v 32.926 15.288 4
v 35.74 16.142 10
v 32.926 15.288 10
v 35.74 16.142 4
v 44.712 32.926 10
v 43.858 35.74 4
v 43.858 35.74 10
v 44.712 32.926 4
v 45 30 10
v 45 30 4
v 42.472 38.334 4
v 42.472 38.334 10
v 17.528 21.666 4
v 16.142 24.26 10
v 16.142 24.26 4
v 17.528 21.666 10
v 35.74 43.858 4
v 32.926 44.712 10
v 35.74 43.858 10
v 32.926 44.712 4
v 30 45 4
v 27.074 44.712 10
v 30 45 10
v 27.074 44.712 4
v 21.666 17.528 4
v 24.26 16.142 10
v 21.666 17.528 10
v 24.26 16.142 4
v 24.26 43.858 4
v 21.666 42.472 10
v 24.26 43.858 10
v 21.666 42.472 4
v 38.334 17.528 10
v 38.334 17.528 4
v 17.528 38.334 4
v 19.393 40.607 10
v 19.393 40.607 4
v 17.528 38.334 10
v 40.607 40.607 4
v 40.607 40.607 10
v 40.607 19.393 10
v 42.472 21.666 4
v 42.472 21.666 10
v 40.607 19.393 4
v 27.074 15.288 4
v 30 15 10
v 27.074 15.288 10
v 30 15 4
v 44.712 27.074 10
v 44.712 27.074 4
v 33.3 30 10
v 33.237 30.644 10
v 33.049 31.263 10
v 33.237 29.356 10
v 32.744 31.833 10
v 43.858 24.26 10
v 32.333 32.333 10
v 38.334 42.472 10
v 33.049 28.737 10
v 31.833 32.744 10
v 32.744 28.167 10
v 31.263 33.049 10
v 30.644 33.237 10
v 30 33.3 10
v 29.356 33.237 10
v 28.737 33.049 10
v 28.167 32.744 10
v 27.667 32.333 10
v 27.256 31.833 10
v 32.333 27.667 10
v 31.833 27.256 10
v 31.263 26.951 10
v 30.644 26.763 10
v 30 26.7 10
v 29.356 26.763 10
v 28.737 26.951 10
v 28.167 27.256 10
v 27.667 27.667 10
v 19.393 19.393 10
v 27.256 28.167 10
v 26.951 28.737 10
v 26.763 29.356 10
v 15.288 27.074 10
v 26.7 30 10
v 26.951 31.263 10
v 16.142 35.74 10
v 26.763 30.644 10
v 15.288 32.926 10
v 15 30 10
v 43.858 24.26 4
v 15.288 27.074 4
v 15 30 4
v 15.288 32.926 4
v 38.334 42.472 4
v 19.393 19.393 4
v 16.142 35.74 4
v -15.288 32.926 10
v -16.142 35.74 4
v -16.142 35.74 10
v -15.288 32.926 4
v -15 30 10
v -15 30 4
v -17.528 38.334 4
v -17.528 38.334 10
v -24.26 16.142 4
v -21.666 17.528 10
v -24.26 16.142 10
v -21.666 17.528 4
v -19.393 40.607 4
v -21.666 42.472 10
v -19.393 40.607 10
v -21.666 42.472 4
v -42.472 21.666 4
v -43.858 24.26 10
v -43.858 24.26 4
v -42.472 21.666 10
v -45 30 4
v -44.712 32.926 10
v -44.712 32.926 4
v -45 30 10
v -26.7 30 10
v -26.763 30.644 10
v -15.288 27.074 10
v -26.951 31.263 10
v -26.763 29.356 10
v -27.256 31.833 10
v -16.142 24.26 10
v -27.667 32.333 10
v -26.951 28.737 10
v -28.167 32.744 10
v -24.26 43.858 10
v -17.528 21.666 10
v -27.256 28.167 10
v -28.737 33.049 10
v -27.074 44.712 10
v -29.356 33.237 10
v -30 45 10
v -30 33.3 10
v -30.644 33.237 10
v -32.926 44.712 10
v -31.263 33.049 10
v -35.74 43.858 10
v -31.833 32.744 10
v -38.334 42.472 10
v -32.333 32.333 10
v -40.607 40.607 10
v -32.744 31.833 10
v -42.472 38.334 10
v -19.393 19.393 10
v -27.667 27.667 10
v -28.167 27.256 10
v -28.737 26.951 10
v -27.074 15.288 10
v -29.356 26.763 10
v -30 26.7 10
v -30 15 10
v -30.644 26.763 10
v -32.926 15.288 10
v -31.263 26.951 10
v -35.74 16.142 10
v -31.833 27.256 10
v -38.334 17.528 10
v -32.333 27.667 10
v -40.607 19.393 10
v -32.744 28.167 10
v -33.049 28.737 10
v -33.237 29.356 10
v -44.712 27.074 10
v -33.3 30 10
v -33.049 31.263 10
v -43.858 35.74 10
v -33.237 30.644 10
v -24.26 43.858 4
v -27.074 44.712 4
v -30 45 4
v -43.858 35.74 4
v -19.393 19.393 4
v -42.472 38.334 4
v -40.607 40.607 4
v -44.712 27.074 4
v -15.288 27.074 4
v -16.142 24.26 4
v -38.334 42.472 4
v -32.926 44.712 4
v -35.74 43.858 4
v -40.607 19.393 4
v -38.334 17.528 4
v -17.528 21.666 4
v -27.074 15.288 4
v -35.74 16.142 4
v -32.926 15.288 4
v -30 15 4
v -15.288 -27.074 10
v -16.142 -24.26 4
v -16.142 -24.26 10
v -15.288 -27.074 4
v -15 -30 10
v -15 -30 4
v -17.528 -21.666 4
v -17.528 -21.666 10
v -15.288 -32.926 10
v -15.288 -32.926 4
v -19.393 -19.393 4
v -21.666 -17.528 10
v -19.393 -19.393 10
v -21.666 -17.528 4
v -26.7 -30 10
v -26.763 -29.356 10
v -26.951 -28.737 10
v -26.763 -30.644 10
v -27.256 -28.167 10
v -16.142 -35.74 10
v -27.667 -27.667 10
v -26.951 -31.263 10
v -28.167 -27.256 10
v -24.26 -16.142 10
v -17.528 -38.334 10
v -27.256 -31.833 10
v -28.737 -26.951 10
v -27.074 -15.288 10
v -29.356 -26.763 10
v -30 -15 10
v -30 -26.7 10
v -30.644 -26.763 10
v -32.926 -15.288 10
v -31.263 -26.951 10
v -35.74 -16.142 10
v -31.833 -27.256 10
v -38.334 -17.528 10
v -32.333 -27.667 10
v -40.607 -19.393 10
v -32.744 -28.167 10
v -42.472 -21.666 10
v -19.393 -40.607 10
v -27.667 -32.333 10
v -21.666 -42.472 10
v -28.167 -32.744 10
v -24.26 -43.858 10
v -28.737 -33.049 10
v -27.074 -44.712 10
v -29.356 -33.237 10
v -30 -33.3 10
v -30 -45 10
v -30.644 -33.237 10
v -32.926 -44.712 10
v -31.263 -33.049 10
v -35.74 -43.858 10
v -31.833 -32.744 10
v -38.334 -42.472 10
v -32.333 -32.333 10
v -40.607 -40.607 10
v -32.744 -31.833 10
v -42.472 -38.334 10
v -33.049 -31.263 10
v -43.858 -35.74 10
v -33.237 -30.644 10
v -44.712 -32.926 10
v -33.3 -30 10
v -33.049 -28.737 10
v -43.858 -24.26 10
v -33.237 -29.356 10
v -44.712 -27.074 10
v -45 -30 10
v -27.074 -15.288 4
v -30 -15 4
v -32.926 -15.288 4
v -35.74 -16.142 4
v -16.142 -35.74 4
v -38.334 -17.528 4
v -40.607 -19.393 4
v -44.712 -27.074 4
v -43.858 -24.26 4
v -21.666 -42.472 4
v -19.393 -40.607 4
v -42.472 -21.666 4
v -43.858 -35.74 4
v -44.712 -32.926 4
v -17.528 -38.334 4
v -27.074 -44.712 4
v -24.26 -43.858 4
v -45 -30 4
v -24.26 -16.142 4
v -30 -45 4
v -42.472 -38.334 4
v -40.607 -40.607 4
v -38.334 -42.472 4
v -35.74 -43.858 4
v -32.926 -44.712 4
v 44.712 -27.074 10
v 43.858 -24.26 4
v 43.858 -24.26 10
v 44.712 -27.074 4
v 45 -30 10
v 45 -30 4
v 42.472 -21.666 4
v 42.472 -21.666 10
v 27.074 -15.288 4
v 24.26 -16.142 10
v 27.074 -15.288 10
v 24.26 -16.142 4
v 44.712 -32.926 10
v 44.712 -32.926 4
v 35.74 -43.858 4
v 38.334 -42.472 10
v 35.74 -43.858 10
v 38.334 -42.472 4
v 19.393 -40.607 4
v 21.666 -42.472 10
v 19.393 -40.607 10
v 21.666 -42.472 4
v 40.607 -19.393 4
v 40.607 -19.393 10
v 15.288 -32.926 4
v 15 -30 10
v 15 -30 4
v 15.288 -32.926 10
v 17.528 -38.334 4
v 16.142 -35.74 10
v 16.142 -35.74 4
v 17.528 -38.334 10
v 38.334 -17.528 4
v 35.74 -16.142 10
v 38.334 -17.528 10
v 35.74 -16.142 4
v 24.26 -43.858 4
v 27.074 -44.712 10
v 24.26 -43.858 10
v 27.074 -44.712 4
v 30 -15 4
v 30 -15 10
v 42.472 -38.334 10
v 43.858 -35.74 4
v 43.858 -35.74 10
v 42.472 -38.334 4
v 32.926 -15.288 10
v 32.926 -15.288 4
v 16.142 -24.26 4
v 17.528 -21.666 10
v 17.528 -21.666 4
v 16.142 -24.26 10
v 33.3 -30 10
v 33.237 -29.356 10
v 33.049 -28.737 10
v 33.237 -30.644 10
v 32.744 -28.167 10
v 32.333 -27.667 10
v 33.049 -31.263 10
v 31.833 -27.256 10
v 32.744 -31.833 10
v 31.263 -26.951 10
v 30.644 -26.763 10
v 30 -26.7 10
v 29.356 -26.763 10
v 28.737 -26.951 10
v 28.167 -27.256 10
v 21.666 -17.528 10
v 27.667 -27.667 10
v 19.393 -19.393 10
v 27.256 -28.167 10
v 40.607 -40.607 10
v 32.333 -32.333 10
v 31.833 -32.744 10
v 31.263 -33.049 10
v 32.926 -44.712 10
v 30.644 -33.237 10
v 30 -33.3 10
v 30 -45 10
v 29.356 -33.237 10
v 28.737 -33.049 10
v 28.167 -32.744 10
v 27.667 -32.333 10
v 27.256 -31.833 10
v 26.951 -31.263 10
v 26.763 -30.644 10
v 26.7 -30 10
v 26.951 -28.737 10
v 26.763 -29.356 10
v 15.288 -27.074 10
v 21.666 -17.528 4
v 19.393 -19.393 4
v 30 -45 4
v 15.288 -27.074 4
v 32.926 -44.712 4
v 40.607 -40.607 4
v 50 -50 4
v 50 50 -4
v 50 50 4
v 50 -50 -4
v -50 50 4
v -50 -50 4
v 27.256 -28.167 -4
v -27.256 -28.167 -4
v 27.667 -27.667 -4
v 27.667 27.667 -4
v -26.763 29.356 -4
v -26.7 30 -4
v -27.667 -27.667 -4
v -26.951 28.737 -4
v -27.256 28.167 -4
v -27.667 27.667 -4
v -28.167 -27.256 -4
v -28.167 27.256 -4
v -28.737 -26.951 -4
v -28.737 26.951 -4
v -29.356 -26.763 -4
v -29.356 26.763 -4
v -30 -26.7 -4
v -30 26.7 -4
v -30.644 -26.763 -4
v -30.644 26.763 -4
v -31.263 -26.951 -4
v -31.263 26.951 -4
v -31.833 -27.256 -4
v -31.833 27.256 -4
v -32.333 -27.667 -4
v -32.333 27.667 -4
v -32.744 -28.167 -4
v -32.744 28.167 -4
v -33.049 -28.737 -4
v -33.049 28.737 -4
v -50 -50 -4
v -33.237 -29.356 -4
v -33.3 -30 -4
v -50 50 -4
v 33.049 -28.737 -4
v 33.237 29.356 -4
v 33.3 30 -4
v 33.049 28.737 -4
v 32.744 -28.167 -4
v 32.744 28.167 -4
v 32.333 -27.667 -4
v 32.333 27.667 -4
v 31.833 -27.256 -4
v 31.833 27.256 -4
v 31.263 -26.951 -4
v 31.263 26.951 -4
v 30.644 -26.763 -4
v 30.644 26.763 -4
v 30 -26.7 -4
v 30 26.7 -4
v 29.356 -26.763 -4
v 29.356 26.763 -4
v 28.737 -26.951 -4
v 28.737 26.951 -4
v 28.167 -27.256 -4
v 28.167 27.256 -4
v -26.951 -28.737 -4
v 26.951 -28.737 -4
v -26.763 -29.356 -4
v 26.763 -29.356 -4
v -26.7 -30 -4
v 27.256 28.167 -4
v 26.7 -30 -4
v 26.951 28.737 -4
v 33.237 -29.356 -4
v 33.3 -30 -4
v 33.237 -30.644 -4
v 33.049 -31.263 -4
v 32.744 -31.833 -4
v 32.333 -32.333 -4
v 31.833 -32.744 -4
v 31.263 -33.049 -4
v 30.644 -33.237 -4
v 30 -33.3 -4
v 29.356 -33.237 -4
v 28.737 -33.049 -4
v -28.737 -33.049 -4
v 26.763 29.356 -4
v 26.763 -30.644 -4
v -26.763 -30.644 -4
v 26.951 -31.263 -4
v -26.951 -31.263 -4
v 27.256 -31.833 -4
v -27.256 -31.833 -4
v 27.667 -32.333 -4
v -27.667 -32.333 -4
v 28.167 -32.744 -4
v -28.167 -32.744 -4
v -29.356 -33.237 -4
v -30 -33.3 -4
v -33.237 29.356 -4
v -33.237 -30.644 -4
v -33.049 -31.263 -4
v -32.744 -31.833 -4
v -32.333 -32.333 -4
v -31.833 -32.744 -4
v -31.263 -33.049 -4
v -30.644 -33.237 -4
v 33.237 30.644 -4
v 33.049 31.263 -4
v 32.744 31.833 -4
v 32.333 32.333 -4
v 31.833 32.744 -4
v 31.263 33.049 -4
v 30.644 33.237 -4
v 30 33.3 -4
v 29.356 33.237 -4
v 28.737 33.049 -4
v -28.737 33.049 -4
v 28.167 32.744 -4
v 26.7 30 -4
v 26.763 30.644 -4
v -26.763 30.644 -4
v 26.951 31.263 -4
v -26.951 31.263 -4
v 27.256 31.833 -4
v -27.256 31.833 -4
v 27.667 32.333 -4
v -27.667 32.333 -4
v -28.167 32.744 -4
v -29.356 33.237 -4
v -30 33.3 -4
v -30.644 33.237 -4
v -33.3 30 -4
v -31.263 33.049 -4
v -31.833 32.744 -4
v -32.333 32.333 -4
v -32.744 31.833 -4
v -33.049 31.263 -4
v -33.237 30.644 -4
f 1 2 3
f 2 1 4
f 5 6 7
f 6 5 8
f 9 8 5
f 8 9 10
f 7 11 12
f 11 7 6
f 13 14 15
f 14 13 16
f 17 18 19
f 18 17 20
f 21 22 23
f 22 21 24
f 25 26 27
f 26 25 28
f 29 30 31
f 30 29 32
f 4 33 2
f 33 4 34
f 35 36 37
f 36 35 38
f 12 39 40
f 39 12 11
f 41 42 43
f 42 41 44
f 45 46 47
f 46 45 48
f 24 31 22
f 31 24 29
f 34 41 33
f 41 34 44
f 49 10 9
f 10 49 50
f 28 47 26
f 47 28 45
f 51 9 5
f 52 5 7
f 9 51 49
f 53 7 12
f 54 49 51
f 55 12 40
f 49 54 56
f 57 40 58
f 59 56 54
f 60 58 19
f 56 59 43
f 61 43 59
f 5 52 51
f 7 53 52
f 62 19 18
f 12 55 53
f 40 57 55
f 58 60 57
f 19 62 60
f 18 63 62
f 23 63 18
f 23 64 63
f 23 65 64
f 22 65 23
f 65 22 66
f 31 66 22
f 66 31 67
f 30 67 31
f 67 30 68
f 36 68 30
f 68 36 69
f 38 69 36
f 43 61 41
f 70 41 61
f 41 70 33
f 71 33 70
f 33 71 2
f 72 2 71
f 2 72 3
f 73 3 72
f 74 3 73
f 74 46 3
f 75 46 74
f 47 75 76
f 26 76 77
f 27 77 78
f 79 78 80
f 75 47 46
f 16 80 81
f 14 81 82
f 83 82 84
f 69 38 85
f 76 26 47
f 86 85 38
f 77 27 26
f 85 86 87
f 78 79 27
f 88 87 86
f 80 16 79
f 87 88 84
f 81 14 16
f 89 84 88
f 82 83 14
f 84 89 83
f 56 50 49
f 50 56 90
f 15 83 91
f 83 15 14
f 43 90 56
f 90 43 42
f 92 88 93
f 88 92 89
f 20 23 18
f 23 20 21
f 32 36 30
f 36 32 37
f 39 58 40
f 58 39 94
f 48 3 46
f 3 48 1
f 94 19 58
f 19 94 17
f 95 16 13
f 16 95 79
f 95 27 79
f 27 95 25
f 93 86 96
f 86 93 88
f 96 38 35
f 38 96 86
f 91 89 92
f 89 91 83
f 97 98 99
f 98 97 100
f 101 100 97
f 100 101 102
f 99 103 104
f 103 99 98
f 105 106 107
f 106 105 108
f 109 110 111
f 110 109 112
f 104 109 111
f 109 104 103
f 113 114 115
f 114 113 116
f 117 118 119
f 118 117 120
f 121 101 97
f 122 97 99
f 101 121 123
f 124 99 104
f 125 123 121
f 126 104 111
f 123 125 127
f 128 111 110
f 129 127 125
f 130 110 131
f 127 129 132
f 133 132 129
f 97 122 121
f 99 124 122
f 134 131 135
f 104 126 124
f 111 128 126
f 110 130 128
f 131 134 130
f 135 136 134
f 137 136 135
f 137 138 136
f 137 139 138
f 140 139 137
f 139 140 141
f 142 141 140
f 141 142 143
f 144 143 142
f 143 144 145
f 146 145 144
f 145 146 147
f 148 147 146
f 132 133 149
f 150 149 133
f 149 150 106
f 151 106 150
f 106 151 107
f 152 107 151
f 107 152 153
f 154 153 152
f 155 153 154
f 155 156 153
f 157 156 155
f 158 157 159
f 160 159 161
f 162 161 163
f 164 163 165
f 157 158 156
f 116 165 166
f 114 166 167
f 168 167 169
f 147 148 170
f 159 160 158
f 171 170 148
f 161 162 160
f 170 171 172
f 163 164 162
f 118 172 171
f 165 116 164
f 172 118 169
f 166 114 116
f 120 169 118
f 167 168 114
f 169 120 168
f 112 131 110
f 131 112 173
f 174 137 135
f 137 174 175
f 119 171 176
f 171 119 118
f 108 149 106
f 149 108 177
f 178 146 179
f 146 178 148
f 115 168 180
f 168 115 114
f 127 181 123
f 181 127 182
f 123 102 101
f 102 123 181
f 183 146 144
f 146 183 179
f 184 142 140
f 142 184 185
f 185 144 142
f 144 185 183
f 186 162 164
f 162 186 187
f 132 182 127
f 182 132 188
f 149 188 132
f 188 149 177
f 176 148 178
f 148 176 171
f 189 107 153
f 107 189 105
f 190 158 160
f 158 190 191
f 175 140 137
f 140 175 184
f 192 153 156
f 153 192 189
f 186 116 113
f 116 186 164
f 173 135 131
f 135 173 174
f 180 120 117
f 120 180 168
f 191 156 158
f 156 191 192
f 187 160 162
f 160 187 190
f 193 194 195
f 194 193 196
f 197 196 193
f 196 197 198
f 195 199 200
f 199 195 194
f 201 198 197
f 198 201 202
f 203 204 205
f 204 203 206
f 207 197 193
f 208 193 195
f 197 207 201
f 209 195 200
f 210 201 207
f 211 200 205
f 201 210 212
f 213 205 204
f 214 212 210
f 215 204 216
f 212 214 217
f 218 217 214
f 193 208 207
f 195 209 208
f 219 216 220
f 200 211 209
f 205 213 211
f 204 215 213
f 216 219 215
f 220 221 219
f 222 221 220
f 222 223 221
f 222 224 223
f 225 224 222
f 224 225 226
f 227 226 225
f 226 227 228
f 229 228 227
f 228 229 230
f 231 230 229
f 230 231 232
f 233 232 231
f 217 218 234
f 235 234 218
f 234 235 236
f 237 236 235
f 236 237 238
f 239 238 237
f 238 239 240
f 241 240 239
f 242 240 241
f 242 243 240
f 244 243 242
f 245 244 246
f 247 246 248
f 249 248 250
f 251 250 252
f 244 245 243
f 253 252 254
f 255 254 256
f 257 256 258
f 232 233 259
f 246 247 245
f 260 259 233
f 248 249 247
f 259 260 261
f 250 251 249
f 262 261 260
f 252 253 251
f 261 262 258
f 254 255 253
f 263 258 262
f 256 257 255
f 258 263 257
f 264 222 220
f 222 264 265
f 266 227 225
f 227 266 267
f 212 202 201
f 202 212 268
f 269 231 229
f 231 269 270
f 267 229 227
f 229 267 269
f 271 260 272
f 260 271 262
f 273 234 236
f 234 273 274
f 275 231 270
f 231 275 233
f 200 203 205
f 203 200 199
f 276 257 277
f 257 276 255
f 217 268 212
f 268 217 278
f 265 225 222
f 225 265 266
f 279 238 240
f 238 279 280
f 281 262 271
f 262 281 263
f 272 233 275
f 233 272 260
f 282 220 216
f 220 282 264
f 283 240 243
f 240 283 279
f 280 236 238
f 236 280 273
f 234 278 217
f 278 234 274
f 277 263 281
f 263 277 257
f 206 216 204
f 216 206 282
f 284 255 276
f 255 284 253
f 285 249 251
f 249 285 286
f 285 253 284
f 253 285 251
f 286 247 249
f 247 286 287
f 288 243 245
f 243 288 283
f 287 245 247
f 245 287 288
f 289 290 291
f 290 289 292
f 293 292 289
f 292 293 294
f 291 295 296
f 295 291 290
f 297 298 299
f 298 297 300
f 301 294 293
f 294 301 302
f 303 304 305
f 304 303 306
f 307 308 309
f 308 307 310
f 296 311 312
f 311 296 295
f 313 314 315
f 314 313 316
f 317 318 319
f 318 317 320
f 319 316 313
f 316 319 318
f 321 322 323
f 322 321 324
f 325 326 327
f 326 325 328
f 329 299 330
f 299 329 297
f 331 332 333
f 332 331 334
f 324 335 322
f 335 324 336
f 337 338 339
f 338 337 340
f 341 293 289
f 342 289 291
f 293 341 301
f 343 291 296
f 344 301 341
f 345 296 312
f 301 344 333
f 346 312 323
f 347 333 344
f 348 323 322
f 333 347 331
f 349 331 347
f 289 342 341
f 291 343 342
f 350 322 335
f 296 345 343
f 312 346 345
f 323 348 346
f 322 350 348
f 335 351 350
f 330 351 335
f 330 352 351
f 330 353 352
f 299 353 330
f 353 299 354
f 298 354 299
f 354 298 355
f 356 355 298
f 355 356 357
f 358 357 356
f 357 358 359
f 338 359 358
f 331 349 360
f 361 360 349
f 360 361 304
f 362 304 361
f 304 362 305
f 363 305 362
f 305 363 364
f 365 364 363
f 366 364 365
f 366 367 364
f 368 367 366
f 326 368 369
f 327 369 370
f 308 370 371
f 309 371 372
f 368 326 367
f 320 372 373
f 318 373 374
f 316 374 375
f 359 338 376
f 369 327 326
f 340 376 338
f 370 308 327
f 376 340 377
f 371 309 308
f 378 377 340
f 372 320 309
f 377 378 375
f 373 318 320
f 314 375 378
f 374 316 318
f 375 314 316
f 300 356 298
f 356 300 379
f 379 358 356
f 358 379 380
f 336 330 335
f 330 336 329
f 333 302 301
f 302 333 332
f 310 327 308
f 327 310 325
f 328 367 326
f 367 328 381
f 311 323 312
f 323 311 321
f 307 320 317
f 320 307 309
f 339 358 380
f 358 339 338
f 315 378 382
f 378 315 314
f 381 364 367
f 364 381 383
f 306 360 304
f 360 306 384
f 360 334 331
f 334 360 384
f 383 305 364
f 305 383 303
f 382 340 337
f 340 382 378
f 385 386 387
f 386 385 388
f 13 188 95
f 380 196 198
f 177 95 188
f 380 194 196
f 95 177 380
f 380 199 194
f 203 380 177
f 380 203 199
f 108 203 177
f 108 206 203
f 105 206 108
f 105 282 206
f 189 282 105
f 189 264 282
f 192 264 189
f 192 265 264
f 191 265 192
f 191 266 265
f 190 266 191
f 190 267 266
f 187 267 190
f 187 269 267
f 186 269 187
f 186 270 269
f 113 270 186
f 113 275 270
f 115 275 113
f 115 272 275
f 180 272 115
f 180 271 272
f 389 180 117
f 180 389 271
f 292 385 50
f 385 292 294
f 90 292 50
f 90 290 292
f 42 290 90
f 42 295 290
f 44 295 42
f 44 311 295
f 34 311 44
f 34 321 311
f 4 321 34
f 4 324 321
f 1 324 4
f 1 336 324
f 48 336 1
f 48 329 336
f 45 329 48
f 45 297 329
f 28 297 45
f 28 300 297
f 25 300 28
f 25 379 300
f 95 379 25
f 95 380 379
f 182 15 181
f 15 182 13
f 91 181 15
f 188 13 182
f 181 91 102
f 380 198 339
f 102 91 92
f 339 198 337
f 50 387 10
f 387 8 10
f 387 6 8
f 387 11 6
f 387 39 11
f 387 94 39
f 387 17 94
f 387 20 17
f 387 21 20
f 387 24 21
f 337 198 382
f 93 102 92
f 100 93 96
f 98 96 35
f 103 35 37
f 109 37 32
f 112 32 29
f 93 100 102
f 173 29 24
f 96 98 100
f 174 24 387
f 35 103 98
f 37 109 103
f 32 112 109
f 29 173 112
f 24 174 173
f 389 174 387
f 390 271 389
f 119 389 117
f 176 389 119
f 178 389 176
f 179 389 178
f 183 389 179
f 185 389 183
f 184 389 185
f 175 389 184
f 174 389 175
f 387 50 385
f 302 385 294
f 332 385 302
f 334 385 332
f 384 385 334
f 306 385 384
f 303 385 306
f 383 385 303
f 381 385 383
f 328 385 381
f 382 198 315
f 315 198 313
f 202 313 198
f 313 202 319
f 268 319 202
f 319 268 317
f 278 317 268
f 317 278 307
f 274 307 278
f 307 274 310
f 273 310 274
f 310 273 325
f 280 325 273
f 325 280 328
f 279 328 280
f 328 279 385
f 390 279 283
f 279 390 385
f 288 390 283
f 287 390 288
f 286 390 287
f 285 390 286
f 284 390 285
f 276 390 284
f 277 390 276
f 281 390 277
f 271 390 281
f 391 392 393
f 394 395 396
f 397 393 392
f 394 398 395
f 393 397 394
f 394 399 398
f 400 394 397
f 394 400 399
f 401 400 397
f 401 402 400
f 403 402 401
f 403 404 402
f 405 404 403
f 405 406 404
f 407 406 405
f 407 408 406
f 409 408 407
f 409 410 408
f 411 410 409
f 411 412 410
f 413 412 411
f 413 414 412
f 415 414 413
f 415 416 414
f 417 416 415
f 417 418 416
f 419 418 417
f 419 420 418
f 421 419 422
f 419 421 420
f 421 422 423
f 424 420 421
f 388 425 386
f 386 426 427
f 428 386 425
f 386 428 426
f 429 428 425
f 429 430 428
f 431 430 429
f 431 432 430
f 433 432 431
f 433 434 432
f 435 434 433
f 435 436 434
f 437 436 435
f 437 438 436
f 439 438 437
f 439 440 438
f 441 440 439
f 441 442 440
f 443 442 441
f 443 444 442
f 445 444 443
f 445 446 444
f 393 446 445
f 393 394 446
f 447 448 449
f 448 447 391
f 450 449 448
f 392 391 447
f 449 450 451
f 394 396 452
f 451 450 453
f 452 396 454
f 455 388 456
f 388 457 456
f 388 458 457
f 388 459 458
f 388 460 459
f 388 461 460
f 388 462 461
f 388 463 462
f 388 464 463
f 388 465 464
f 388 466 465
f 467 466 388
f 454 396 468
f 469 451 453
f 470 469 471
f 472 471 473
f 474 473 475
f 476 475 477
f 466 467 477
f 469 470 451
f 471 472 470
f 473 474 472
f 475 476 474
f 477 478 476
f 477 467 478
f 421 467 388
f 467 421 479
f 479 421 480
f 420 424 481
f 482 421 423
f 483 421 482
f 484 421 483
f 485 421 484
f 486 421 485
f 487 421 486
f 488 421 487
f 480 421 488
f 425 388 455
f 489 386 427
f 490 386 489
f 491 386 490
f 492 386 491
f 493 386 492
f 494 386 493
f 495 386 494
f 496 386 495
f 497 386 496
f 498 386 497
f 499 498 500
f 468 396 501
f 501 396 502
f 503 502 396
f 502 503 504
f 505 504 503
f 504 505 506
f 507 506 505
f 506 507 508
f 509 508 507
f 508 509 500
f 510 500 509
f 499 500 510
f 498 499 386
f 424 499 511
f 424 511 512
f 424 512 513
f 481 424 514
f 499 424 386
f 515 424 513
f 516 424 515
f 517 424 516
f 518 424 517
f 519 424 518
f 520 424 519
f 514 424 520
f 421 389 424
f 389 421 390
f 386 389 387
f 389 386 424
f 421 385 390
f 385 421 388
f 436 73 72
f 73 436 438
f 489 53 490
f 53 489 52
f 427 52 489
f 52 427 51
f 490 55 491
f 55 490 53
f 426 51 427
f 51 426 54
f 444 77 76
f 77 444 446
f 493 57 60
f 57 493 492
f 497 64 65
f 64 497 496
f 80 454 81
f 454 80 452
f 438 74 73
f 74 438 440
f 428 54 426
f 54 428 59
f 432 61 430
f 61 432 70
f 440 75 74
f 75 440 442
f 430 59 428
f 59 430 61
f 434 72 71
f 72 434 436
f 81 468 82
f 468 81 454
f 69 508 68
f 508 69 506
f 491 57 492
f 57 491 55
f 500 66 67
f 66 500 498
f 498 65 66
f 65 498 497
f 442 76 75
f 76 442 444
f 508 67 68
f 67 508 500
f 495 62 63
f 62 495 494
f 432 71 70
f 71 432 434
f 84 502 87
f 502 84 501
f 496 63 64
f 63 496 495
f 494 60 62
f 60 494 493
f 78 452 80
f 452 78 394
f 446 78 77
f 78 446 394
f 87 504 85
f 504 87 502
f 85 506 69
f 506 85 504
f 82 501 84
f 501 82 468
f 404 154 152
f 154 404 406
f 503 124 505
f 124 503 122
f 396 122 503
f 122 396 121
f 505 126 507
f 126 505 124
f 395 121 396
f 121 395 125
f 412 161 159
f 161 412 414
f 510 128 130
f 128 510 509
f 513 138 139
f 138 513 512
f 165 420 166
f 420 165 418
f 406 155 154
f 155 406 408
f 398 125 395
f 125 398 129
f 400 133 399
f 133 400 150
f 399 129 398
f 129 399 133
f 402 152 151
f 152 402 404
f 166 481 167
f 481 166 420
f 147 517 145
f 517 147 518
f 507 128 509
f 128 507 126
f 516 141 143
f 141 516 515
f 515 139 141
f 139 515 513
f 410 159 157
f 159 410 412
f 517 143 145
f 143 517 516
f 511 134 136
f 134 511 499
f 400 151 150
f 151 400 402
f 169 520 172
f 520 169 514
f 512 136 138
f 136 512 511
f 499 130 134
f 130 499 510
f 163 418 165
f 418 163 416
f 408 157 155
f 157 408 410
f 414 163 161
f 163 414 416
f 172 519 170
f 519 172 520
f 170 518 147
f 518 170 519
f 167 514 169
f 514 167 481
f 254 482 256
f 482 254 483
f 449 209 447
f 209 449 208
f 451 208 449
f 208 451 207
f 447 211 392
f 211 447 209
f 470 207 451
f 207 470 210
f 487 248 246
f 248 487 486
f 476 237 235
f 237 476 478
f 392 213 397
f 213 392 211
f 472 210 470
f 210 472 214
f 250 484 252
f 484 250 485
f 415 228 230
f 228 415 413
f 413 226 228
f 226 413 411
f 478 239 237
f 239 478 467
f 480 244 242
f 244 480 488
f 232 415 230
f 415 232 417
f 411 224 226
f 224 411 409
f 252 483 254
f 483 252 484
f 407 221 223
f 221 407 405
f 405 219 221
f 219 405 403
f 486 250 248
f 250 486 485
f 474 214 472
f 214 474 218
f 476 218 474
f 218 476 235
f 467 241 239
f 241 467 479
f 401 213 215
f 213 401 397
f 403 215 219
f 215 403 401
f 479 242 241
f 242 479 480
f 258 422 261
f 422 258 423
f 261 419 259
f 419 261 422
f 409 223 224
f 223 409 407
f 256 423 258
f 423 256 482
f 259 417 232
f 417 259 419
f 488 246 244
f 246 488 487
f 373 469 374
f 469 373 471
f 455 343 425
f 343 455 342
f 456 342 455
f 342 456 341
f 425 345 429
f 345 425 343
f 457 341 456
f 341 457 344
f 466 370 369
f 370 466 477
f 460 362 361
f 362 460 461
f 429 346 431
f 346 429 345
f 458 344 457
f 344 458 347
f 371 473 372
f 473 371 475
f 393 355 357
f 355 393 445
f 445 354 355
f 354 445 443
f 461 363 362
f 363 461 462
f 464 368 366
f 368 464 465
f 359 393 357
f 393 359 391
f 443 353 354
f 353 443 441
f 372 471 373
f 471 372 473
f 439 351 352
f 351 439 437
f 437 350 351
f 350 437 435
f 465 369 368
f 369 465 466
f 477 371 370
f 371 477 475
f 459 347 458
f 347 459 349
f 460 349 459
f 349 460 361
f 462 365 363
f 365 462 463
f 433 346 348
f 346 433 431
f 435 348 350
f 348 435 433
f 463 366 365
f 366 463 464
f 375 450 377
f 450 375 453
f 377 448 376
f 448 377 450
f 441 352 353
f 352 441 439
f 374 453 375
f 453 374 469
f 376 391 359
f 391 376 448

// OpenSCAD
$fn = 32;

// ----------------------------------------------------------------------
// Anchor pads 100 x 100 x 14
// four corner bosses with anchor holes
// ----------------------------------------------------------------------

// --- parameters (mm) ---
plate = [100, 100, 8];  // base plate size (x, y, z)
pads = 4;               // boss count, one per corner
edge = 20;              // boss centre offset from the plate edge
boss_d = 30;            // boss diameter
boss_h = 6;             // boss height above the base plate
hole_d = 6.6;           // hole diameter

// --- derived feature positions (mm) ---
height = plate[2] + boss_h;      // = 14   overall height of the part
corner_x = plate[0] / 2 - edge;  // = 30   boss centre X
corner_y = plate[1] / 2 - edge;  // = 30   boss centre Y
feature_centers = [
  [corner_x, corner_y],
  [-corner_x, corner_y],
  [-corner_x, -corner_y],
  [corner_x, -corner_y]
];   // boss centres, anchor holes are drilled there

// base plate, four bosses standing on it, anchor holes all the way through
difference() {
  union() {
    cube(plate, center = true);
    for (centre = feature_centers)
      translate([centre[0], centre[1], plate[2] / 2 - 1])
        cylinder(d = boss_d, h = boss_h + 1);
  }
  for (centre = feature_centers)
    translate([centre[0], centre[1], -height])
      cylinder(d = hole_d, h = 2 * height + 2);  // through boss and plate
}
